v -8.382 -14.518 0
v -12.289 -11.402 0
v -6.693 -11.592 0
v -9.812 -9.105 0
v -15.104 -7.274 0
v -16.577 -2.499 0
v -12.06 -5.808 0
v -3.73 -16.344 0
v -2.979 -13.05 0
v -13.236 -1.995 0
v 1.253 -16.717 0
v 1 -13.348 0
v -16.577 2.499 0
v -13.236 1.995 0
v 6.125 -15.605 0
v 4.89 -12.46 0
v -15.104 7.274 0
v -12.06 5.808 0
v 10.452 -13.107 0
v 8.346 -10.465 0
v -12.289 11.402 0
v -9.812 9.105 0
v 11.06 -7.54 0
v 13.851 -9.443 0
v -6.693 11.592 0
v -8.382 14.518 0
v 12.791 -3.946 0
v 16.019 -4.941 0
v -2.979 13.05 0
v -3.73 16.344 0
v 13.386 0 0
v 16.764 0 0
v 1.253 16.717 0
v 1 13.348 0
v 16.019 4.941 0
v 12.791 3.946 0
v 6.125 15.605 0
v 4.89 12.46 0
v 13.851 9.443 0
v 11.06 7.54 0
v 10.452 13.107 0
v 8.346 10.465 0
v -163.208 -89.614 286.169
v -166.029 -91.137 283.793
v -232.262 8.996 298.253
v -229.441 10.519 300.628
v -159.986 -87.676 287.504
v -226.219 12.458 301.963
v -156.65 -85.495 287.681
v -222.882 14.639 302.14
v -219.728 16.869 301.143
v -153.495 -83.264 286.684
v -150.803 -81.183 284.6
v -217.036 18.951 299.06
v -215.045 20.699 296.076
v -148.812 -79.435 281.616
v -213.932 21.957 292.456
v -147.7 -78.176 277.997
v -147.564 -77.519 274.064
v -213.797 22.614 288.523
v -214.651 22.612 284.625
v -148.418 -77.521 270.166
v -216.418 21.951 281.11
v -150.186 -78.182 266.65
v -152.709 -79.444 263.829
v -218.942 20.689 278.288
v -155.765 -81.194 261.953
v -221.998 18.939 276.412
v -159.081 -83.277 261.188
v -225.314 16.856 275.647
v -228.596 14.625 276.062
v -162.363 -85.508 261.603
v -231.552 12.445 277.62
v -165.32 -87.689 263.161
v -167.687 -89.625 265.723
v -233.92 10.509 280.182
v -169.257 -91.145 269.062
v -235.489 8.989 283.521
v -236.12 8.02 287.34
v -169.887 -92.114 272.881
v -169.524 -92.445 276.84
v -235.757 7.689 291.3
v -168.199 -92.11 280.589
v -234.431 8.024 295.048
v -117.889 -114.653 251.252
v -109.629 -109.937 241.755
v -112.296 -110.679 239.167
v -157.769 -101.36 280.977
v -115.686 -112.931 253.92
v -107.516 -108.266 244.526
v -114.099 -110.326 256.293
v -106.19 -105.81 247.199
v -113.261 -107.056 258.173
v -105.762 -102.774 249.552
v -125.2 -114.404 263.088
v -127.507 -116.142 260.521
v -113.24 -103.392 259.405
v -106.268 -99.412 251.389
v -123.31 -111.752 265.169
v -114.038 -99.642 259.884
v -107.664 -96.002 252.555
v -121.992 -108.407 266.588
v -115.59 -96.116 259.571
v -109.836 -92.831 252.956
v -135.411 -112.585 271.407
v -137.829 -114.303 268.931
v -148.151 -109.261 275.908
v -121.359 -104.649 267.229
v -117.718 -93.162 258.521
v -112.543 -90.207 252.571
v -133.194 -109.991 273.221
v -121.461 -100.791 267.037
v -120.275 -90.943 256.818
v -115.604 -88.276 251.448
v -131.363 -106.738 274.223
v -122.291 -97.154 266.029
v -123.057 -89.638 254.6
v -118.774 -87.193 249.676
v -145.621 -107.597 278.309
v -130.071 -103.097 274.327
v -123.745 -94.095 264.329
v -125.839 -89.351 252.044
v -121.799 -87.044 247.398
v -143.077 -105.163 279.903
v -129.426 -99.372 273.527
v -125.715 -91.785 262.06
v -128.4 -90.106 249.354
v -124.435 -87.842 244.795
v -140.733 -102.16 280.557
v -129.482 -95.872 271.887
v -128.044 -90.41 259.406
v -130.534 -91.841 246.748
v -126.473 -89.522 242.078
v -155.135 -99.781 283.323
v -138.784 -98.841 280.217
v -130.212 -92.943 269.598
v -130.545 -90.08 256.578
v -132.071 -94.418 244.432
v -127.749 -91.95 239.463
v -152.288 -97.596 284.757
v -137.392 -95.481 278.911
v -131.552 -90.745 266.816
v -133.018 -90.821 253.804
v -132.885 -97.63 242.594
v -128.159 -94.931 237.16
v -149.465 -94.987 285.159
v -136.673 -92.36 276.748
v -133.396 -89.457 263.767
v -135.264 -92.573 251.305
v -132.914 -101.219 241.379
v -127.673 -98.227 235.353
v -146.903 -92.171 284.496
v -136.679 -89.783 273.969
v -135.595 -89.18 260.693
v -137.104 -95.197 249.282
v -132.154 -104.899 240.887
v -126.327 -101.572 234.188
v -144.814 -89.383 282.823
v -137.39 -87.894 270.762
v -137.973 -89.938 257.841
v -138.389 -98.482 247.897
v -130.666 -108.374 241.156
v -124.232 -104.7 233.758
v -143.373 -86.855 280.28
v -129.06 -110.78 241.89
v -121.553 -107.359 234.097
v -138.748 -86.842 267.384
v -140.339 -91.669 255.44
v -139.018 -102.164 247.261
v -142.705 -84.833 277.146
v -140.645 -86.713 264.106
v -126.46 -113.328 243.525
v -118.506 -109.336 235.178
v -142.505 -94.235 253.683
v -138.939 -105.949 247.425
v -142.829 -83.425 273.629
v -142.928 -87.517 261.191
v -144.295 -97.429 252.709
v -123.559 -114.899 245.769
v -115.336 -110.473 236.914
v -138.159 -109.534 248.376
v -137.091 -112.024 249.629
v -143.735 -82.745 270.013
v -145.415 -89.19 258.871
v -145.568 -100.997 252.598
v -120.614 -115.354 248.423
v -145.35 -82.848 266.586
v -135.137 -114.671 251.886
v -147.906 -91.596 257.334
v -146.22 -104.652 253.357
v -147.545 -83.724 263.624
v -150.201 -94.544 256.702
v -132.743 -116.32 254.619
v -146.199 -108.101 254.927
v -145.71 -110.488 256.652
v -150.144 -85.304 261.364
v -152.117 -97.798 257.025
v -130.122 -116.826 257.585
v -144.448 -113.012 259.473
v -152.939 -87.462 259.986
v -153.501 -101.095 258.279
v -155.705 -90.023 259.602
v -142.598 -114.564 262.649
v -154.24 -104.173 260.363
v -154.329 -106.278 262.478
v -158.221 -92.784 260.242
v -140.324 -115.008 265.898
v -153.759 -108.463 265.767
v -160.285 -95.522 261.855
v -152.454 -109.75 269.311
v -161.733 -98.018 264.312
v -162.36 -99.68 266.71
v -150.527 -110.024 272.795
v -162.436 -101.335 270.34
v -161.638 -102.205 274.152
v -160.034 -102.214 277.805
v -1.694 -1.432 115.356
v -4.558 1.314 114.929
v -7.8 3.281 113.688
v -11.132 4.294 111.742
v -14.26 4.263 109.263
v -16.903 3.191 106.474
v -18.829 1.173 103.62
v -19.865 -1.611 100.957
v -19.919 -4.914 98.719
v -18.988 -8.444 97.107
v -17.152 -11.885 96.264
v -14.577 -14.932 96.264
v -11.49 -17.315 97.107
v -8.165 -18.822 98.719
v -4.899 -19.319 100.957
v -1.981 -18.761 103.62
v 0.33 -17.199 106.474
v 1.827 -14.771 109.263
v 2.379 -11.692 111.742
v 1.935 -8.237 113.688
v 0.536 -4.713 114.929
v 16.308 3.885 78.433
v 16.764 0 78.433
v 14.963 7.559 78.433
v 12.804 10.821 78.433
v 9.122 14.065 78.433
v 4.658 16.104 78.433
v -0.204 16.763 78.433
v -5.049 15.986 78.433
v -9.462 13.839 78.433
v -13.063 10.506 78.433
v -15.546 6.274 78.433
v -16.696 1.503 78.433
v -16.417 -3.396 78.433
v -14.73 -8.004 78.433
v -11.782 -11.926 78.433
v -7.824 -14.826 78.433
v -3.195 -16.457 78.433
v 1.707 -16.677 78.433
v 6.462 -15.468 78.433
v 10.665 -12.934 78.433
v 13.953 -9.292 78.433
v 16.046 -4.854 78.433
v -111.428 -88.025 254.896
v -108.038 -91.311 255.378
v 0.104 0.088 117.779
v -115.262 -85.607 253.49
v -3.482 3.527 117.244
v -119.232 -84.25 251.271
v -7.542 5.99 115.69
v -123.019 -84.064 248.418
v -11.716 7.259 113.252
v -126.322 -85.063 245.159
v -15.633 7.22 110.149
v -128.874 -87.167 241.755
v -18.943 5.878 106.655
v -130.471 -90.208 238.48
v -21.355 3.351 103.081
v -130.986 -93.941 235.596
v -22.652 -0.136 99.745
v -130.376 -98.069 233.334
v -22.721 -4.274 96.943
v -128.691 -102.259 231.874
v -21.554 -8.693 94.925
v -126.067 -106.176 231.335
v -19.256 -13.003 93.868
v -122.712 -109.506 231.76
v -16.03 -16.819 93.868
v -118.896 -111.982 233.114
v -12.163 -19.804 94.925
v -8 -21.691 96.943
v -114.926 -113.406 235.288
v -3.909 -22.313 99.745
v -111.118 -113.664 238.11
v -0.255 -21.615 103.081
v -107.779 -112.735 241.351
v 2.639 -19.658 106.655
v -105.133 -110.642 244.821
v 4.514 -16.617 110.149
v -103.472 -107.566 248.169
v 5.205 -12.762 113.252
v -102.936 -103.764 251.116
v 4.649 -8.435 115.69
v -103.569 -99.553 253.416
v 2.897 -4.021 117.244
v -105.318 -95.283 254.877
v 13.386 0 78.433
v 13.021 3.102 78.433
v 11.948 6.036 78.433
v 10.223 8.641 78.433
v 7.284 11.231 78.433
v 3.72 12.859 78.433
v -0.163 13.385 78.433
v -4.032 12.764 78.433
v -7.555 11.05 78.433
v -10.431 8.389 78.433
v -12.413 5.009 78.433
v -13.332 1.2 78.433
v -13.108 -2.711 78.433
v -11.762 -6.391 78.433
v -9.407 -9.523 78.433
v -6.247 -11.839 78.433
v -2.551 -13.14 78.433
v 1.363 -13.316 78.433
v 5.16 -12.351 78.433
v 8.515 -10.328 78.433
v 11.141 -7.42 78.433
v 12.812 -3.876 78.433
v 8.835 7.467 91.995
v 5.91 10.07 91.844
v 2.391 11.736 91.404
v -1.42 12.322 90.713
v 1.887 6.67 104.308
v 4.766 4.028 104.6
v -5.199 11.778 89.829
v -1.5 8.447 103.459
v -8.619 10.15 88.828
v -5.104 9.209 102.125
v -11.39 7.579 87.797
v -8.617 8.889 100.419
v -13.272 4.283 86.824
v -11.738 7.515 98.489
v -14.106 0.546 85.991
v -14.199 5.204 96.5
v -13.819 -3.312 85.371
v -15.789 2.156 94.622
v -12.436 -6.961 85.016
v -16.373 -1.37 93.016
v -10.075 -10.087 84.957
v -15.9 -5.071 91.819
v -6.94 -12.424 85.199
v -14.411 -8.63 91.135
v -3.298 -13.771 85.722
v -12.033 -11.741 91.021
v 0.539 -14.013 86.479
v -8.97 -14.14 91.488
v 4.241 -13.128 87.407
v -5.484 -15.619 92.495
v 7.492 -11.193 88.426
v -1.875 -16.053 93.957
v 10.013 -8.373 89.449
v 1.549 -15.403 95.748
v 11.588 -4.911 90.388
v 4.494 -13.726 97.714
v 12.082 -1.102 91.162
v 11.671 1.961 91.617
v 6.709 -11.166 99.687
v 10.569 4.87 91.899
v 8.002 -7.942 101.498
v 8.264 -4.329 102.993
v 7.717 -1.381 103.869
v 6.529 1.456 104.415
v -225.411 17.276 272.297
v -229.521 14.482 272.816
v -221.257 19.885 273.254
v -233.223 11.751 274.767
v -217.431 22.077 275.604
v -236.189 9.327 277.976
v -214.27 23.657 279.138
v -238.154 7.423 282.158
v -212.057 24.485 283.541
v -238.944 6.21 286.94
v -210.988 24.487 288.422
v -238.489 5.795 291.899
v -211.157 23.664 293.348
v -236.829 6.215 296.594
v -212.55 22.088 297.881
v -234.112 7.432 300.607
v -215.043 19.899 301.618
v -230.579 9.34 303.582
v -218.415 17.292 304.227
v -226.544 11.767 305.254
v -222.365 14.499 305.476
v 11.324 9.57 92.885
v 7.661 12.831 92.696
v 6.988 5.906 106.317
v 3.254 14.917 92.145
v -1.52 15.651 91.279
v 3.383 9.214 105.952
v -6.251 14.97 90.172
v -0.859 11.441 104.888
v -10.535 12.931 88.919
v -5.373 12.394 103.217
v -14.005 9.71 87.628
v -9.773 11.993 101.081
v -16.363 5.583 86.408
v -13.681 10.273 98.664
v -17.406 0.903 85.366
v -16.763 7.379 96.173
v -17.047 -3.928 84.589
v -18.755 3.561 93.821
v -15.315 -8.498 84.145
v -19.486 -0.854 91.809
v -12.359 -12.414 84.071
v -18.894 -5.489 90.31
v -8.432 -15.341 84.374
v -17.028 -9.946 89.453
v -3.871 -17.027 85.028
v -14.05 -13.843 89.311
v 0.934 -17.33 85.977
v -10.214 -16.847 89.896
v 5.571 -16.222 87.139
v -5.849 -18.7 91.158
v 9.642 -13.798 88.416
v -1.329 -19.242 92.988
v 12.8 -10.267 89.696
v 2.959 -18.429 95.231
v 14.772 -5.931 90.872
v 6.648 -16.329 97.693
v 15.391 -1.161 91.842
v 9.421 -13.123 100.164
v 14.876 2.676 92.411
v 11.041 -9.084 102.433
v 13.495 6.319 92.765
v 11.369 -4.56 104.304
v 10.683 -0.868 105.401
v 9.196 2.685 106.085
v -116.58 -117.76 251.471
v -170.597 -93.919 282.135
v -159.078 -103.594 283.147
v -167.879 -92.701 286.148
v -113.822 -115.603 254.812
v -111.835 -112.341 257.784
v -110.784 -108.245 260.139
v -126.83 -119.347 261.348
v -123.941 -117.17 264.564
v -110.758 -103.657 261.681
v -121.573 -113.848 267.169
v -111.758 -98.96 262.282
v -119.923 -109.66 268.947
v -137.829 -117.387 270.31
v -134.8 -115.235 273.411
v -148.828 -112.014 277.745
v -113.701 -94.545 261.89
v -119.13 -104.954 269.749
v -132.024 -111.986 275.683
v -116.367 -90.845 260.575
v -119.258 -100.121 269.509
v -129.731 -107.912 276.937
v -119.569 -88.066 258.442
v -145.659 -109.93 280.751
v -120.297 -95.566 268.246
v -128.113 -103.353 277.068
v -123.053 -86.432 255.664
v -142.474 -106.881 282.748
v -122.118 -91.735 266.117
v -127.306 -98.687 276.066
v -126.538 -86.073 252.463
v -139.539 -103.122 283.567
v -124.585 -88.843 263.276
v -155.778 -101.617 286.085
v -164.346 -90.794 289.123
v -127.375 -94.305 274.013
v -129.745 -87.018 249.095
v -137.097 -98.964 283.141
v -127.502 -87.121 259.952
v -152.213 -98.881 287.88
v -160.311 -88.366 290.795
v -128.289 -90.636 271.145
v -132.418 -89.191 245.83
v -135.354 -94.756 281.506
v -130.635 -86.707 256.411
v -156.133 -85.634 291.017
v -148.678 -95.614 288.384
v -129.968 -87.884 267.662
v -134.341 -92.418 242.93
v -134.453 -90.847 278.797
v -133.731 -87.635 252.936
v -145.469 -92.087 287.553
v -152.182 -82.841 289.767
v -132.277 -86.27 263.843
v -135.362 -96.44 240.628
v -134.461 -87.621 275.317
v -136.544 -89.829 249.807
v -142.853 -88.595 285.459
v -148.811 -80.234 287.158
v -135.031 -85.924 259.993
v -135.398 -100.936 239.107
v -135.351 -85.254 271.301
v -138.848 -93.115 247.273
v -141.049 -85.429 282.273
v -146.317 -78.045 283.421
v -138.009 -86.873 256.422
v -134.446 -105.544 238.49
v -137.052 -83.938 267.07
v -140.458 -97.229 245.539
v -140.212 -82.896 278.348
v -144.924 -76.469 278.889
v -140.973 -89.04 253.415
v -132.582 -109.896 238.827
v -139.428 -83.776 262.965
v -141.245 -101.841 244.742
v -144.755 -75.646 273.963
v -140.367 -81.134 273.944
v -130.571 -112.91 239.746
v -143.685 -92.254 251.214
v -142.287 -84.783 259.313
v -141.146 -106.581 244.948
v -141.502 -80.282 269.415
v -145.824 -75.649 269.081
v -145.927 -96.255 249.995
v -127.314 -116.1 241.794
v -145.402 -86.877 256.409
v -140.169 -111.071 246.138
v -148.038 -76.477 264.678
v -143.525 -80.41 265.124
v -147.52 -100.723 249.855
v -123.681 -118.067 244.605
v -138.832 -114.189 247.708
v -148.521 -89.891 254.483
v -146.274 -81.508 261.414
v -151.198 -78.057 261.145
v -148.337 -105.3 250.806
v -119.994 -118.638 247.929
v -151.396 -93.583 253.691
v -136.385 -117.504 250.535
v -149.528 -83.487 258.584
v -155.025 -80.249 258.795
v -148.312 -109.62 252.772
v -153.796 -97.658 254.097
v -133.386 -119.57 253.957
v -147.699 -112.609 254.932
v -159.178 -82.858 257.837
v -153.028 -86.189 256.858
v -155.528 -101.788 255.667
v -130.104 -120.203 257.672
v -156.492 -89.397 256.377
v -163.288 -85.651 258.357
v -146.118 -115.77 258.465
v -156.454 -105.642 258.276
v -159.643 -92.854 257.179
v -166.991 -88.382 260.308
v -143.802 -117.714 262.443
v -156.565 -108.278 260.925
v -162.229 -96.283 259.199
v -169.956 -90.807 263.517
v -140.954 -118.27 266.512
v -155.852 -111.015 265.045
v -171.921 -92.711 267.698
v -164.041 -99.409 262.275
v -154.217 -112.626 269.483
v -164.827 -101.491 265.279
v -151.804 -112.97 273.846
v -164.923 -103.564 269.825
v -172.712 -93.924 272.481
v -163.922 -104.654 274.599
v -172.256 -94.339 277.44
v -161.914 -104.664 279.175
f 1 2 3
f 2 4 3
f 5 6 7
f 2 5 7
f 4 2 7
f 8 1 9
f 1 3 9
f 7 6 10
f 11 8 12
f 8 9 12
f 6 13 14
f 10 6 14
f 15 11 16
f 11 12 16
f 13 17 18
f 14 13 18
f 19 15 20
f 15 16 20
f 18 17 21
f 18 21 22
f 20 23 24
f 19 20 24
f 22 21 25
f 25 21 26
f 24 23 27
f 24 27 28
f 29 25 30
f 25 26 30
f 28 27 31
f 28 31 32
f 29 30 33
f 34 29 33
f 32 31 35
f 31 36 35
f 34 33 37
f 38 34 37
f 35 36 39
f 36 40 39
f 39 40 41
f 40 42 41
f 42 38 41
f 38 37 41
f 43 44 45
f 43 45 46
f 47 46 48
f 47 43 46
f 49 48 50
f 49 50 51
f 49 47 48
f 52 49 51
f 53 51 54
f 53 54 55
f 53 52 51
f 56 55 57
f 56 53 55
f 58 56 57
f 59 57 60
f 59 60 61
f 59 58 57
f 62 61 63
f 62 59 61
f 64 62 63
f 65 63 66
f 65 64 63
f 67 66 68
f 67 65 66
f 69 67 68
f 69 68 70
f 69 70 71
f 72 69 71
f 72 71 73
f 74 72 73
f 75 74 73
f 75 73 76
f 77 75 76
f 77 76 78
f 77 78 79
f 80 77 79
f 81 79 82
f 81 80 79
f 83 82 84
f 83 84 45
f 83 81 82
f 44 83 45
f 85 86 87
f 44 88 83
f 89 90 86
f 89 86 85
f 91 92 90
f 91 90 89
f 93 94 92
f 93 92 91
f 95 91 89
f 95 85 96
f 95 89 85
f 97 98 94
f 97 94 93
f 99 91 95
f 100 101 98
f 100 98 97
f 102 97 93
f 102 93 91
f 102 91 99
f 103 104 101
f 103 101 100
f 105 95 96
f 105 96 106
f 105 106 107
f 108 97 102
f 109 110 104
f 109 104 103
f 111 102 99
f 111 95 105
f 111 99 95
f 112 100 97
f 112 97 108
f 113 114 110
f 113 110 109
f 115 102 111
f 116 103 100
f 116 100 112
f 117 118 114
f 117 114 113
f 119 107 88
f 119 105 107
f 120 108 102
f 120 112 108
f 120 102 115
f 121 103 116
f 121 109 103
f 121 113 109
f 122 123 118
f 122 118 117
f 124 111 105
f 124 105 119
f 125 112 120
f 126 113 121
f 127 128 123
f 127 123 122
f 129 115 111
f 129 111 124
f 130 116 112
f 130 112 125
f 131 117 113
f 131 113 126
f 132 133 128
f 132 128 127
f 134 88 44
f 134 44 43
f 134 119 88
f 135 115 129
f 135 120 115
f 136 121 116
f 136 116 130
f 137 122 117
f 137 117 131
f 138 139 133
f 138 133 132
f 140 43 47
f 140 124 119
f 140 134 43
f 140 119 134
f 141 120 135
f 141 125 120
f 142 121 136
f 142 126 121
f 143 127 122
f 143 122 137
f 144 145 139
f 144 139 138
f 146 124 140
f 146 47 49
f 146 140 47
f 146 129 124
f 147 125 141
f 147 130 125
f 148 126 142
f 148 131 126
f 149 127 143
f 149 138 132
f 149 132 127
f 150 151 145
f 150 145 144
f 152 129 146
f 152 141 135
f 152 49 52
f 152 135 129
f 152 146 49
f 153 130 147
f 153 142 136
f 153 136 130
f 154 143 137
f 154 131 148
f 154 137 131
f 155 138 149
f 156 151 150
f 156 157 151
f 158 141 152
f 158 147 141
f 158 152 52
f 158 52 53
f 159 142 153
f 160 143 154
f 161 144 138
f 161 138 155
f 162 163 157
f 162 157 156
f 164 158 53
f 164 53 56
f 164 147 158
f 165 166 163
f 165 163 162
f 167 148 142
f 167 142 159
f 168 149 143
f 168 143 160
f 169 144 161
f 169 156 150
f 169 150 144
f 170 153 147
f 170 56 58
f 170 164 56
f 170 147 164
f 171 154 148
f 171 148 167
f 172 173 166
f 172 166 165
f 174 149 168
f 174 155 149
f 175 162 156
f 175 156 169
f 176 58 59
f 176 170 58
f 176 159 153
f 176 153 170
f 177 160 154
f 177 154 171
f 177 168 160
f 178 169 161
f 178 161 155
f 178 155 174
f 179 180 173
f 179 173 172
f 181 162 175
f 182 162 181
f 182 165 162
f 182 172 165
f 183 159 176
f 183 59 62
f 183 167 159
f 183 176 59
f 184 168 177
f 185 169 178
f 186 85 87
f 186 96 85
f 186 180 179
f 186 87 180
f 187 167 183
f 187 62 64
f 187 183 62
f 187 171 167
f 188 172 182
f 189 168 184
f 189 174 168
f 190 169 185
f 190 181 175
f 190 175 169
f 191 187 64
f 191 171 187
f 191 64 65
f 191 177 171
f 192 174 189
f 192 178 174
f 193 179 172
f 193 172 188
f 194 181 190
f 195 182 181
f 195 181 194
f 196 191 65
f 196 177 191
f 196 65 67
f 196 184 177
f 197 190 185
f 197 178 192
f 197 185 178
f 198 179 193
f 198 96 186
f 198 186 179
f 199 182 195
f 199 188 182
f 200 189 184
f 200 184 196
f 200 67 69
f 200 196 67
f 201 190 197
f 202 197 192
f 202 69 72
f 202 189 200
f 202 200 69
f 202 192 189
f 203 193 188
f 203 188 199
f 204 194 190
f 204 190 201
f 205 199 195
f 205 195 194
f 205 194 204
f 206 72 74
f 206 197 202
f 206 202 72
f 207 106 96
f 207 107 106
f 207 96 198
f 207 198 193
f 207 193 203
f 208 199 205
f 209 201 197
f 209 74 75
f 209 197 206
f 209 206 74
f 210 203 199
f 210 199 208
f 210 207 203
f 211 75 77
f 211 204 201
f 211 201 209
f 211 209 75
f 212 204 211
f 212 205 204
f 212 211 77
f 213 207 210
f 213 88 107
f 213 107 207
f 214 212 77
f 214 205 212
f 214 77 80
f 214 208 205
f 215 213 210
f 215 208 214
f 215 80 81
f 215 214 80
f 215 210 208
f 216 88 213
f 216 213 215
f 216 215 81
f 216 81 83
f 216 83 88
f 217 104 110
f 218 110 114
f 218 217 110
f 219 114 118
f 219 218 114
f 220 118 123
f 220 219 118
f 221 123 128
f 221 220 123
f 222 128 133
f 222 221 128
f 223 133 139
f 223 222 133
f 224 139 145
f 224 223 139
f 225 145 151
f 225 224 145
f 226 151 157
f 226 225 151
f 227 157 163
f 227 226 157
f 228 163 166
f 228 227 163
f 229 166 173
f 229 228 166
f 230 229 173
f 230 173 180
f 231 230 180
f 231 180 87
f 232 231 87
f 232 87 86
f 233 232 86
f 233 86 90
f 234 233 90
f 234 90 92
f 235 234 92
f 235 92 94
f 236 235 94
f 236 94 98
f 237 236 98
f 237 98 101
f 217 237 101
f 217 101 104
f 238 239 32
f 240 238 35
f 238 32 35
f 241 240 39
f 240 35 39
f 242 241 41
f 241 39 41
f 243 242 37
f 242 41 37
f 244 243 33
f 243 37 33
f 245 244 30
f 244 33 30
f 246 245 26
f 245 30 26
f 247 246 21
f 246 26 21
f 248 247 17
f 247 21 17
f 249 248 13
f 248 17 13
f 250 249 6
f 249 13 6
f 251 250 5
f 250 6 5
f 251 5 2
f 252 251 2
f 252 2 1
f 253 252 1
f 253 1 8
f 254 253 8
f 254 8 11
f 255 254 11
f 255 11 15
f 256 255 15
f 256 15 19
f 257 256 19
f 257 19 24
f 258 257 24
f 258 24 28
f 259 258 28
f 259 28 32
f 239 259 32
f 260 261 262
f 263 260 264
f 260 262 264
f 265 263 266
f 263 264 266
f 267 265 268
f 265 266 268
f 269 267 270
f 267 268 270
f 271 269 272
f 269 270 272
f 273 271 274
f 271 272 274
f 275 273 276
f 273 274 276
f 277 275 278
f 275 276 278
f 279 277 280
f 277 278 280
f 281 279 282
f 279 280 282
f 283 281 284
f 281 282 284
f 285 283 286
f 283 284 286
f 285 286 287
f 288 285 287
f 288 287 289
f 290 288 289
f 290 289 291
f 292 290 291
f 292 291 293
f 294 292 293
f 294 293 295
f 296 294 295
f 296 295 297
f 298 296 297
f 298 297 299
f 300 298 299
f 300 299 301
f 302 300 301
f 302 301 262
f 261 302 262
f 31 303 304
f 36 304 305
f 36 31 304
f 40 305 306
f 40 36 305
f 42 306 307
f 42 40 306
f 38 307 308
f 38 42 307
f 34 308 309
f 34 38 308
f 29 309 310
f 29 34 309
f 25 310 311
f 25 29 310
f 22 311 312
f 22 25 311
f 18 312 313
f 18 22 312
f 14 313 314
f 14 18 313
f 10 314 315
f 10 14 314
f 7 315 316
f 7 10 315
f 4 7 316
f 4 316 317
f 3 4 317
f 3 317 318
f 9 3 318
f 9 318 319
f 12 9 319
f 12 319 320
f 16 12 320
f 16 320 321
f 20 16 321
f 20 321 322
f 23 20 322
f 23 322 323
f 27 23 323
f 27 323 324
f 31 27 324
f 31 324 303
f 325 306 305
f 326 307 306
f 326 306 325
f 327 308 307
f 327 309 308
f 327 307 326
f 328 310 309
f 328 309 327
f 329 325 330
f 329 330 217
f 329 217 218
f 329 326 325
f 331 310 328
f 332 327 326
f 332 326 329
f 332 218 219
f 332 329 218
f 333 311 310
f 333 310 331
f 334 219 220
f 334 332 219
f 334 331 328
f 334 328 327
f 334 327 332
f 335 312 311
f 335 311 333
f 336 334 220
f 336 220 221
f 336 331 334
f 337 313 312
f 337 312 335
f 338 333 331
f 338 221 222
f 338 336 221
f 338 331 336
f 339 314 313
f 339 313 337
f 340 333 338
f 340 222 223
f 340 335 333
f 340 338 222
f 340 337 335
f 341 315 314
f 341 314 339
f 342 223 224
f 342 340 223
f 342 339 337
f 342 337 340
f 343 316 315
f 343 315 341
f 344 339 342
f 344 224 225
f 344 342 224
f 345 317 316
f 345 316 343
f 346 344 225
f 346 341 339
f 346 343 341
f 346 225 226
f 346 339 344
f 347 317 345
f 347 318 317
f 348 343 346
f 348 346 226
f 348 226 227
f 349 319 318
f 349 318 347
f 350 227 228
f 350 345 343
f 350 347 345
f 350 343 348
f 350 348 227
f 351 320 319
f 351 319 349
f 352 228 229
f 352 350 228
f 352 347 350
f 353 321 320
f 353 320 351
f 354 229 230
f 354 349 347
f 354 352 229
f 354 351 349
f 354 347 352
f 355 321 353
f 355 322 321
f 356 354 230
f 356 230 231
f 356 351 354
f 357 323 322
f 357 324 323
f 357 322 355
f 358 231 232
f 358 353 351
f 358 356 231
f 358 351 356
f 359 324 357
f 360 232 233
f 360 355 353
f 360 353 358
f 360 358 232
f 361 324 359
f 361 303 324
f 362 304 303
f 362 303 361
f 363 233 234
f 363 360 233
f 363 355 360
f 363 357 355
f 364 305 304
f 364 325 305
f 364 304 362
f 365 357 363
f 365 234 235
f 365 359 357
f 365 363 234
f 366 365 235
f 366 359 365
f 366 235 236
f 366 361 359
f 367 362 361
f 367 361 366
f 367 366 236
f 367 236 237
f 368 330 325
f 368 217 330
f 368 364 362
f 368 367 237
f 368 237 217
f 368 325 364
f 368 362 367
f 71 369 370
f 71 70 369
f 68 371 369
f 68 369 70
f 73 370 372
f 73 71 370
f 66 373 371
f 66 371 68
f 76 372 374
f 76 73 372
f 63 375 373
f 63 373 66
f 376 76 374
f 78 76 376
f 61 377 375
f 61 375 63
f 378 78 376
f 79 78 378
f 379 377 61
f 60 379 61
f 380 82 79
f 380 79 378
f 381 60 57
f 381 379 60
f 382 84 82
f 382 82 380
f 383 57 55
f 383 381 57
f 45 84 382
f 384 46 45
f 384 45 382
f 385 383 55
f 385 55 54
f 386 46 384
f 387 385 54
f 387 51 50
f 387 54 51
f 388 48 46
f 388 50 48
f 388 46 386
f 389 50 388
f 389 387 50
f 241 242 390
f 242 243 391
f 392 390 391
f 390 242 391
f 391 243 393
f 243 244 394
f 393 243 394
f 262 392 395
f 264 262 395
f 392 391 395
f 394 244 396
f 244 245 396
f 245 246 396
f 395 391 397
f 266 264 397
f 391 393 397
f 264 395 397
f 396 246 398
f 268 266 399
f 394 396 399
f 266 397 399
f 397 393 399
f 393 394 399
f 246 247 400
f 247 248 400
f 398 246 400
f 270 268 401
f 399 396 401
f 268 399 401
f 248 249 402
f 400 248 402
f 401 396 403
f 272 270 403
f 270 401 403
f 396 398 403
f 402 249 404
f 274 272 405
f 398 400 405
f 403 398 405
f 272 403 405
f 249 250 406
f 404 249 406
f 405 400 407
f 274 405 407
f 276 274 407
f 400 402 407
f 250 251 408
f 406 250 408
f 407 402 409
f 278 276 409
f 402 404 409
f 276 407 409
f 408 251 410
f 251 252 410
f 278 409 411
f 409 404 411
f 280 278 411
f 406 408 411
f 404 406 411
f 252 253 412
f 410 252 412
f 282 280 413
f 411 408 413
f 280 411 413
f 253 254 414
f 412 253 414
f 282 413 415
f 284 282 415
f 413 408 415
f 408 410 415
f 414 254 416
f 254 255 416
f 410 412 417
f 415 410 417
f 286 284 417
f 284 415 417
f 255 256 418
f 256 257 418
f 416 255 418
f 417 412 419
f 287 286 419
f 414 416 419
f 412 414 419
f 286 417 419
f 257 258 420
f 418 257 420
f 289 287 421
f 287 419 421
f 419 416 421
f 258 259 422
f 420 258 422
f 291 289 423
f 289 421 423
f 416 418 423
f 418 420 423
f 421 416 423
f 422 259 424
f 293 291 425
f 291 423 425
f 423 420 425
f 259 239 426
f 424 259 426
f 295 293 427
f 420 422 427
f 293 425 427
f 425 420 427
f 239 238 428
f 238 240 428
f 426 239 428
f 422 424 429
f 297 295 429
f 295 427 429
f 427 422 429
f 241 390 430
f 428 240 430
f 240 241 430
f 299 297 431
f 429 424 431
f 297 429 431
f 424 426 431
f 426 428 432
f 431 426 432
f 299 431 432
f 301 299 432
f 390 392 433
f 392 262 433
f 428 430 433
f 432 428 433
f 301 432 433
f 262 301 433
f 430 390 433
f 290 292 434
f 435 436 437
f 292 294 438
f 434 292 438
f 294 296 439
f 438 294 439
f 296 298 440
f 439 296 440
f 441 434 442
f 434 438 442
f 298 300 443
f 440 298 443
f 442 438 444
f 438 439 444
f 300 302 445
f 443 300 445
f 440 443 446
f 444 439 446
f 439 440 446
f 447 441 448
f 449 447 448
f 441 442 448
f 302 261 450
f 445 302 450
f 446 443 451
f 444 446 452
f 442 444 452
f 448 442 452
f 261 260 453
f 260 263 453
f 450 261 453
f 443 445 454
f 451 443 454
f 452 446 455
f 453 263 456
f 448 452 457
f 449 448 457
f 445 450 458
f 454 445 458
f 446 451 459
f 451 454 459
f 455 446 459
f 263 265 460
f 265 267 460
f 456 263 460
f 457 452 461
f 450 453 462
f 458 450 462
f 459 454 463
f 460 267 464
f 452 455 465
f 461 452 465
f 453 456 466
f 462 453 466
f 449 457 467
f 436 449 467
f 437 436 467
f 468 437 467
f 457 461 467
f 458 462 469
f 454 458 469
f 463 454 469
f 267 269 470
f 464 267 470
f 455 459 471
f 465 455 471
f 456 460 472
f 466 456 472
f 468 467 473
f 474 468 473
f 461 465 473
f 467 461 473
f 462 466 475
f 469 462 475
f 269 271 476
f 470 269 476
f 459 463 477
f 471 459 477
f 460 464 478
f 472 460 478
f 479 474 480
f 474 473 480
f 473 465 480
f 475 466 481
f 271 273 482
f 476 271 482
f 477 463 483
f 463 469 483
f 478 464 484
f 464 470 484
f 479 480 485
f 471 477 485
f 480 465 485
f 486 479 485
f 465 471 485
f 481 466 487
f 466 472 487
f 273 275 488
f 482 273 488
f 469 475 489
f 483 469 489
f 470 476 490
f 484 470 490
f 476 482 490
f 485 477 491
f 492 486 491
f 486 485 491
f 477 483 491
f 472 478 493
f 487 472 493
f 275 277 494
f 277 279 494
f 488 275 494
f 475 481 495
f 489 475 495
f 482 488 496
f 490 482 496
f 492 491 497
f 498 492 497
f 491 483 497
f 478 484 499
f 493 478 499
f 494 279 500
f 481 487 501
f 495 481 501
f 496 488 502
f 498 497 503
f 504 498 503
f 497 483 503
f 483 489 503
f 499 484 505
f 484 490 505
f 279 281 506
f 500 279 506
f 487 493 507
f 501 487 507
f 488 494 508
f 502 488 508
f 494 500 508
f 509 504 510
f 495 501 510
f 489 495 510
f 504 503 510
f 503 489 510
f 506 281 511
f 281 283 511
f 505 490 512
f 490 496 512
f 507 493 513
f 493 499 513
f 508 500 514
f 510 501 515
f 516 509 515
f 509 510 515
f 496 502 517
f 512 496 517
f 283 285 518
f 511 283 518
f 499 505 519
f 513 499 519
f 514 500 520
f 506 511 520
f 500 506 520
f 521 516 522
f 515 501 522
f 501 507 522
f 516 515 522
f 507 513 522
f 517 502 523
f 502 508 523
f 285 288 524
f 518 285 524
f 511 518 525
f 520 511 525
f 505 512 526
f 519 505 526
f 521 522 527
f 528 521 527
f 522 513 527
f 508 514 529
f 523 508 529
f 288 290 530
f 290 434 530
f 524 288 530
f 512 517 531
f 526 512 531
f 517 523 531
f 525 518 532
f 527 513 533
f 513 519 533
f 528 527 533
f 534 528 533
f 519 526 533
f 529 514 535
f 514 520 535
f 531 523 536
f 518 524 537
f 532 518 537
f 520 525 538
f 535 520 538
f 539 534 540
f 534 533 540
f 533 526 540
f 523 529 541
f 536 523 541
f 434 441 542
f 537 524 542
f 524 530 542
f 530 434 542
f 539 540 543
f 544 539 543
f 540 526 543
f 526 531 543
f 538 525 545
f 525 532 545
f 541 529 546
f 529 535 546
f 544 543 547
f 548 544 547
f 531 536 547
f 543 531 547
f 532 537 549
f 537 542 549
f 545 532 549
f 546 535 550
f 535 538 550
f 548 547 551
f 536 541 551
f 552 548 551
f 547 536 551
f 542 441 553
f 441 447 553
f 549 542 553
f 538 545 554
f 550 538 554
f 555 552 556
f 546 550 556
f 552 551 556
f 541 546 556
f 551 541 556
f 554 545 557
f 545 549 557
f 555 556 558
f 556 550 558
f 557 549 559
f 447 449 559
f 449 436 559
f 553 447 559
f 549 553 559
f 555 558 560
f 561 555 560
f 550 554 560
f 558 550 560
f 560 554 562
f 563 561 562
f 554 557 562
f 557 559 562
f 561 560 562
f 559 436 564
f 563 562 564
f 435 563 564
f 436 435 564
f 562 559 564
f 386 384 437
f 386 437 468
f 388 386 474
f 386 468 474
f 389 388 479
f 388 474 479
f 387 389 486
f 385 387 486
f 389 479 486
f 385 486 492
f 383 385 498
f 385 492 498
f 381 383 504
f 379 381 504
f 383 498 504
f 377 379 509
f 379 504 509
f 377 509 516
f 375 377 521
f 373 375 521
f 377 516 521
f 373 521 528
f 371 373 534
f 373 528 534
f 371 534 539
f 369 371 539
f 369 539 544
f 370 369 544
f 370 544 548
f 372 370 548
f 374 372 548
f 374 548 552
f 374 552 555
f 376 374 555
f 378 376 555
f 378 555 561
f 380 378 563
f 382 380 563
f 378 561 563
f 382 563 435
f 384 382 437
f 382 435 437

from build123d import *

# Parameters (mm, degrees)
PIPESKETCH_R    = 16.764
PIPESKETCH_R_2  = 13.3858
EXTRUSION_DEPTH = 78.43305879
SKETCH_1_R      = 16.764
SKETCH_1_R_2    = 13.3858
REVOLVE_1_ANGLE = 45.819311821
SKETCH_2_R      = 16.764
SKETCH_2_R_2    = 13.3858
EXTRUDE_1_DEPTH = 197.43866419
SKETCH_3_R      = 16.764
SKETCH_3_R_2    = 13.3858
REVOLVE_2_ANGLE = 90
SKETCH_4_R      = 16.764
SKETCH_4_R_2    = 13.3858
EXTRUDE_2_DEPTH = 120.923725302


with BuildPart() as part:
    # PipeSketch → Extrusion (new body)
    with BuildSketch(Plane.XY):
        Circle(PIPESKETCH_R)
        Circle(PIPESKETCH_R_2, mode=Mode.SUBTRACT)
    extrude(amount=EXTRUSION_DEPTH)

    # 草图1 → 旋转1 (revolve)
    with BuildSketch(Plane.XY.offset(78.43305879)):
        with Locations(Location((0, 0, 0), (0, 0, 40.203758457))):
            Circle(SKETCH_1_R)
        with Locations(Location((0, 0, 0), (0, 0, 40.203758457))):
            Circle(SKETCH_1_R_2, mode=Mode.SUBTRACT)
    revolve(axis=Axis((-29.09901546, -24.593846776, 78.43305879), (0.6455077894006402, -0.7637536866183356, 0)), revolution_arc=REVOLVE_1_ANGLE)

    # 草图2 → 凸台-拉伸1 (add)
    with BuildSketch(Plane(origin=(-44.905078471, -37.952783004, 57.137323745), x_dir=(0.8366600265340762, -0.3030542664308184, 0.4562434784170373), z_dir=(-0.5477225575051652, -0.4629230385328477, 0.6969234250586765))):
        with Locations(Location((43.130838557, 52.305939514, 0), (0, 0, 50.491424948))):
            Circle(SKETCH_2_R)
        with Locations(Location((43.130838557, 52.305939514, 0), (0, 0, 50.491424948))):
            Circle(SKETCH_2_R_2, mode=Mode.SUBTRACT)
    extrude(amount=EXTRUDE_1_DEPTH)

    # 草图3 → 旋转2 (revolve)
    with BuildSketch(Plane(origin=(-153.046688572, -129.351689355, 194.736953831), x_dir=(0.8366600265340762, -0.3030542664308184, 0.4562434784170373), z_dir=(-0.5477225575051652, -0.4629230385328477, 0.6969234250586765))):
        with Locations(Location((43.130838557, 52.305939514, 0), (0, 0, 310.893394649))):
            Circle(SKETCH_3_R)
        with Locations(Location((43.130838557, 52.305939514, 0), (0, 0, 310.893394649))):
            Circle(SKETCH_3_R_2, mode=Mode.SUBTRACT)
    revolve(axis=Axis((-137.829069481, -67.303204468, 247.911671562), (-0.6324555320336762, -0.31622776601683844, -0.707106781186547)), revolution_arc=REVOLVE_2_ANGLE)

    # 草图4 → 凸台-拉伸2 (add)
    with BuildSketch(Plane(origin=(-27.059582229, 40.909884227, 5.907369706), x_dir=(0.8366600265340752, 0.5420999882976981, 0.07827900540781119), z_dir=(-0.5477225575051666, 0.8280714102029578, 0.11957315586905065))):
        with Locations(Location((-157.337165059, -283.786451217, 0), (0, 0, 229.106605351))):
            Circle(SKETCH_4_R)
        with Locations(Location((-157.337165059, -283.786451217, 0), (0, 0, 229.106605351))):
            Circle(SKETCH_4_R_2, mode=Mode.SUBTRACT)
    extrude(amount=EXTRUDE_2_DEPTH)


solid = part.part
